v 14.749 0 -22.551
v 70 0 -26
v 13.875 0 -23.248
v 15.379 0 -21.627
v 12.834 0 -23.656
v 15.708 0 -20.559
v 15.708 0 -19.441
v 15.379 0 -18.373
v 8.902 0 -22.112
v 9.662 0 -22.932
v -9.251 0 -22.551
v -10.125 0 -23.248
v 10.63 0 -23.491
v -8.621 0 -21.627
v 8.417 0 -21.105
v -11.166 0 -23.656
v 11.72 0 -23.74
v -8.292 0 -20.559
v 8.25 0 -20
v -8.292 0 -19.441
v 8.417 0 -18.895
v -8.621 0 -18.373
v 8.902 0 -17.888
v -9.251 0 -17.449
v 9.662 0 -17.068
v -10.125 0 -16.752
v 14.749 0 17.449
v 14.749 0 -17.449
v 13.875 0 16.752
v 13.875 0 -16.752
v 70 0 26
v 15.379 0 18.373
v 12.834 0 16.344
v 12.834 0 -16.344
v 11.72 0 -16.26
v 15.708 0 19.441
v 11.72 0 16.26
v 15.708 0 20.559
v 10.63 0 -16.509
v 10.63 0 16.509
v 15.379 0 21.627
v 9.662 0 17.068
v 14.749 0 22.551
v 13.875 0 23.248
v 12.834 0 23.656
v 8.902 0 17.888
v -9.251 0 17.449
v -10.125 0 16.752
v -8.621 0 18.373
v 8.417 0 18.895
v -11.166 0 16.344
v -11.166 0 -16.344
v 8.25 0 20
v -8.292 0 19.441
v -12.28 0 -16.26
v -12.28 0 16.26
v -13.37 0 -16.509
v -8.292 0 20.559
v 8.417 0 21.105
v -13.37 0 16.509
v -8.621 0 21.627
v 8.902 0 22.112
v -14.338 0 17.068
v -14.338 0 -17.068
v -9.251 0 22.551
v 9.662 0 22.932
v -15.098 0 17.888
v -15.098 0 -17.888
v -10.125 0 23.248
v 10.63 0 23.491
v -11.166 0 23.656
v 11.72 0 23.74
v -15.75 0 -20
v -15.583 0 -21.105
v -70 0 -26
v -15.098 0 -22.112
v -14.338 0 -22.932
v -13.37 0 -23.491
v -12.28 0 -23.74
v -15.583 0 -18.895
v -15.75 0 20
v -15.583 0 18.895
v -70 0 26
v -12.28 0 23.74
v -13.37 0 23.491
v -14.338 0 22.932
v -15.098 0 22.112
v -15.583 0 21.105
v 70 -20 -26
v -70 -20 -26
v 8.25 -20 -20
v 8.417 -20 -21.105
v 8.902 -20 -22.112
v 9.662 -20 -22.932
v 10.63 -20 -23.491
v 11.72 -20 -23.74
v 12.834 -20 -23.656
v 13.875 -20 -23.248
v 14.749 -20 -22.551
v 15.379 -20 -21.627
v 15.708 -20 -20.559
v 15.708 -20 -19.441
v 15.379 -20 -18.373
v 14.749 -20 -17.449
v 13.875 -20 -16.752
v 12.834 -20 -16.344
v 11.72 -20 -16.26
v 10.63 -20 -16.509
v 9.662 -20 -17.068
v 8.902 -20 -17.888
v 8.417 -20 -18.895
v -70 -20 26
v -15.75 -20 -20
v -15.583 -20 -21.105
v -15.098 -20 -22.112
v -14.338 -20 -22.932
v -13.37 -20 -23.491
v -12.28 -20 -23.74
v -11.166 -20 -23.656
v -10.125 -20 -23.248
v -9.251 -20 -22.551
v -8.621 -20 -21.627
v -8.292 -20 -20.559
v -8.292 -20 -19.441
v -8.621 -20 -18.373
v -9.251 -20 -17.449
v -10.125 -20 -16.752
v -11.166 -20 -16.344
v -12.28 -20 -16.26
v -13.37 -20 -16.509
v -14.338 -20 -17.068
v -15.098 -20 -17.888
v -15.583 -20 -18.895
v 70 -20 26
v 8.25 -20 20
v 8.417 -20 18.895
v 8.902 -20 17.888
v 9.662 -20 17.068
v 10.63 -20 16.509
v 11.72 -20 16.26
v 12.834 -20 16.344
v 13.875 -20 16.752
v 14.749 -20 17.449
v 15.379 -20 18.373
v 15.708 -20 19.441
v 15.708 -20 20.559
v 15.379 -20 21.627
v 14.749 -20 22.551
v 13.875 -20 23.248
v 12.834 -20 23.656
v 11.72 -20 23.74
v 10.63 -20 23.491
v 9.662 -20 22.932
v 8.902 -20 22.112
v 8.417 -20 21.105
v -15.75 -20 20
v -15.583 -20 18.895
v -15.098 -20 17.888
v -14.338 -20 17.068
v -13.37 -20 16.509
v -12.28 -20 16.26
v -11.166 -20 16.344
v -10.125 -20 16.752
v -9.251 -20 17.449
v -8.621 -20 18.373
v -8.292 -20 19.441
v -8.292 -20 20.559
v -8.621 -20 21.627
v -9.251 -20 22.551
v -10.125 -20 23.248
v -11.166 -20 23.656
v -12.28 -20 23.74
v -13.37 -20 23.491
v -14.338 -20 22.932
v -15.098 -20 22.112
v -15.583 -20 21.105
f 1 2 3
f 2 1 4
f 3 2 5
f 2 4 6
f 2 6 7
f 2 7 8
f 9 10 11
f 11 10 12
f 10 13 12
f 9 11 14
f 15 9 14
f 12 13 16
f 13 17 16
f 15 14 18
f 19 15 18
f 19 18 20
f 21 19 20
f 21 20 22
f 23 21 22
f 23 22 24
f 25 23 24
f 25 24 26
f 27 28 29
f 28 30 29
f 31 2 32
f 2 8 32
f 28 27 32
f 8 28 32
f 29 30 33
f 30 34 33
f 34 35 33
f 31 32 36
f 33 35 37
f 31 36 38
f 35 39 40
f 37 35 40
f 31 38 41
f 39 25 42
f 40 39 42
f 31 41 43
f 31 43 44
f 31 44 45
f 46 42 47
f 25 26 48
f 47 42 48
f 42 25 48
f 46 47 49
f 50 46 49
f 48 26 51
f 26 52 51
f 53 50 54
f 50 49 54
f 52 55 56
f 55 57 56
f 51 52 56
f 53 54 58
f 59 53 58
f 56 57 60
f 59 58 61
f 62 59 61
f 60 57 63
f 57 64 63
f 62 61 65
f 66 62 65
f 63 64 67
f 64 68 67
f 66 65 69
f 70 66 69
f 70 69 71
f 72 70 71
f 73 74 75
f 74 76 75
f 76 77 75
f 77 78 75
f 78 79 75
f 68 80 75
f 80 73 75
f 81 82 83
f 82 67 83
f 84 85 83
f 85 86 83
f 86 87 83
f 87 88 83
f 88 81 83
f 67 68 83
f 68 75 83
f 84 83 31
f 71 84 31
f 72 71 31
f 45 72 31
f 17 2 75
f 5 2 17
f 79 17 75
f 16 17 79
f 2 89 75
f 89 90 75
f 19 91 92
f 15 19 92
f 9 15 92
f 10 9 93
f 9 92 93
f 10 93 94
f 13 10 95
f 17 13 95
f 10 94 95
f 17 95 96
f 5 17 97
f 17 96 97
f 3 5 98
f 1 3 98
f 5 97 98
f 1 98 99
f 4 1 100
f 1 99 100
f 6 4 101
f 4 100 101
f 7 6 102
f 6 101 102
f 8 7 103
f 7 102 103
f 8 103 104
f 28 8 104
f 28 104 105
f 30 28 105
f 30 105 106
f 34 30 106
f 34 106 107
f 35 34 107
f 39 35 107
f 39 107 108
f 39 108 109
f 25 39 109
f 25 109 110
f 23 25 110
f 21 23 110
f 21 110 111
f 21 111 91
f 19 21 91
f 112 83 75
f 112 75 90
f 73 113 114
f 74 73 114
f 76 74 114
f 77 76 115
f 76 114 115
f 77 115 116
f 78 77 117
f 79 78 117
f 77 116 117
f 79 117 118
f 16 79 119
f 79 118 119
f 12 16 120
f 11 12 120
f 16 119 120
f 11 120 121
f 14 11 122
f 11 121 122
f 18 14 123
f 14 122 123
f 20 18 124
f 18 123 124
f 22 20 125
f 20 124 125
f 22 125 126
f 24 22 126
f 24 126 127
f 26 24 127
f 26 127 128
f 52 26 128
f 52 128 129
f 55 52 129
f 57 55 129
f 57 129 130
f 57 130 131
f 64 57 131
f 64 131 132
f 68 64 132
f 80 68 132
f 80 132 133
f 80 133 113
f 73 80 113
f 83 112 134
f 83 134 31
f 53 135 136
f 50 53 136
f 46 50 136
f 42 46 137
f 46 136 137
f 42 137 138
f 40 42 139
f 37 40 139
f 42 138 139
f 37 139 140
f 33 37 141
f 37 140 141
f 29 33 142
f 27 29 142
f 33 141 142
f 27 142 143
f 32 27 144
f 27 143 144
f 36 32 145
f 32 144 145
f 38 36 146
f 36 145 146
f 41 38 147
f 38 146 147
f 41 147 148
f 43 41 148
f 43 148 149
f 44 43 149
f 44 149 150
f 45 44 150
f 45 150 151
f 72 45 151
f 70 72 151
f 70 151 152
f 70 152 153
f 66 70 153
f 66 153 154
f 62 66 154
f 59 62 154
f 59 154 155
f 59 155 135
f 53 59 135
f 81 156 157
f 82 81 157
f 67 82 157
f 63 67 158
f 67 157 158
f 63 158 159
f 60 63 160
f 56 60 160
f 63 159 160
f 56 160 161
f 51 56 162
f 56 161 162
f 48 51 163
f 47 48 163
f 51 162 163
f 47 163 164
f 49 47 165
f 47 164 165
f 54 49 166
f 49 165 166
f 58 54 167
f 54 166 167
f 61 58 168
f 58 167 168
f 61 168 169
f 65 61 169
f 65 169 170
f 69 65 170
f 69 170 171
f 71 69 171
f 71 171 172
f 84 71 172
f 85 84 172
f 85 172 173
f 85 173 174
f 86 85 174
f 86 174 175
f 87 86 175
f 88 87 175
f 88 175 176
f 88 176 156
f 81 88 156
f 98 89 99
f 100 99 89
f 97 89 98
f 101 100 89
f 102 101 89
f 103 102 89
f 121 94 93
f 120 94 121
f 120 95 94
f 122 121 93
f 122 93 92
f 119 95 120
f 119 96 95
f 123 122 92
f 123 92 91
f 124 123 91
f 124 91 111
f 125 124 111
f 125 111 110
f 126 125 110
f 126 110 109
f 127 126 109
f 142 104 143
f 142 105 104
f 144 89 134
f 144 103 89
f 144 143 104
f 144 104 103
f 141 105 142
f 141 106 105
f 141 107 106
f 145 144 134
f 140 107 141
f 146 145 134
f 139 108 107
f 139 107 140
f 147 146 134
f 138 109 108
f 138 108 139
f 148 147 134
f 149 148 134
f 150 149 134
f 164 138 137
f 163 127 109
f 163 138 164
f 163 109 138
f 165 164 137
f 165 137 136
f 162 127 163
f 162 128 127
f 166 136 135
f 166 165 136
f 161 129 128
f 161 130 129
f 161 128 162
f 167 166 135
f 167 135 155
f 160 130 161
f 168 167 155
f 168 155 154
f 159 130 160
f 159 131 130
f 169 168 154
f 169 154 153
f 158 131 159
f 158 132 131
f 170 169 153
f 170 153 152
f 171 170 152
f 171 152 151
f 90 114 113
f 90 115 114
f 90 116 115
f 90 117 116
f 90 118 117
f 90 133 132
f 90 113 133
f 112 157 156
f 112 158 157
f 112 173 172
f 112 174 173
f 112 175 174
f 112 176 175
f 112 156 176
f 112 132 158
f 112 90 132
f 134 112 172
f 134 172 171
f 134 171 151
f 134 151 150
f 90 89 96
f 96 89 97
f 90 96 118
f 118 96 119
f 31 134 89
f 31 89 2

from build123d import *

# Parameters (mm, degrees)
F0_W     = 40
F0_H     = 52
F1_DEPTH = 20
F2_D     = 7.5
F3_W     = 20
F3_H     = 52
F4_DEPTH = 50
F5_W     = 20
F5_H     = 52
F6_DEPTH = 50


with BuildPart() as f1:
    # F0 (on Front) → F1 (new body)
    with BuildSketch(Plane.XZ):
        Rectangle(F0_W, F0_H)
    extrude(amount=F1_DEPTH)

    # F2 (through all)
    with Locations(Plane(origin=(0, 0, 0), x_dir=(1, 0, 0), z_dir=(0, 1, 0))):
        with Locations((12, 20), (-12, 20), (12, -20), (-12, -20)):
            Hole(F2_D / 2)

    # F3 (on face) → F4 (join)
    with BuildSketch(Plane(origin=(-20, 0, 0), x_dir=(0, -1, 0), z_dir=(-1, 0, 0))):
        with Locations((10, 0)):
            Rectangle(F3_W, F3_H)
    extrude(amount=F4_DEPTH)

    # F5 (on face) → F6 (join)
    with BuildSketch(Plane.YZ.offset(20)):
        with Locations((-10, 0)):
            Rectangle(F5_W, F5_H)
    extrude(amount=F6_DEPTH)


solid = f1.part
